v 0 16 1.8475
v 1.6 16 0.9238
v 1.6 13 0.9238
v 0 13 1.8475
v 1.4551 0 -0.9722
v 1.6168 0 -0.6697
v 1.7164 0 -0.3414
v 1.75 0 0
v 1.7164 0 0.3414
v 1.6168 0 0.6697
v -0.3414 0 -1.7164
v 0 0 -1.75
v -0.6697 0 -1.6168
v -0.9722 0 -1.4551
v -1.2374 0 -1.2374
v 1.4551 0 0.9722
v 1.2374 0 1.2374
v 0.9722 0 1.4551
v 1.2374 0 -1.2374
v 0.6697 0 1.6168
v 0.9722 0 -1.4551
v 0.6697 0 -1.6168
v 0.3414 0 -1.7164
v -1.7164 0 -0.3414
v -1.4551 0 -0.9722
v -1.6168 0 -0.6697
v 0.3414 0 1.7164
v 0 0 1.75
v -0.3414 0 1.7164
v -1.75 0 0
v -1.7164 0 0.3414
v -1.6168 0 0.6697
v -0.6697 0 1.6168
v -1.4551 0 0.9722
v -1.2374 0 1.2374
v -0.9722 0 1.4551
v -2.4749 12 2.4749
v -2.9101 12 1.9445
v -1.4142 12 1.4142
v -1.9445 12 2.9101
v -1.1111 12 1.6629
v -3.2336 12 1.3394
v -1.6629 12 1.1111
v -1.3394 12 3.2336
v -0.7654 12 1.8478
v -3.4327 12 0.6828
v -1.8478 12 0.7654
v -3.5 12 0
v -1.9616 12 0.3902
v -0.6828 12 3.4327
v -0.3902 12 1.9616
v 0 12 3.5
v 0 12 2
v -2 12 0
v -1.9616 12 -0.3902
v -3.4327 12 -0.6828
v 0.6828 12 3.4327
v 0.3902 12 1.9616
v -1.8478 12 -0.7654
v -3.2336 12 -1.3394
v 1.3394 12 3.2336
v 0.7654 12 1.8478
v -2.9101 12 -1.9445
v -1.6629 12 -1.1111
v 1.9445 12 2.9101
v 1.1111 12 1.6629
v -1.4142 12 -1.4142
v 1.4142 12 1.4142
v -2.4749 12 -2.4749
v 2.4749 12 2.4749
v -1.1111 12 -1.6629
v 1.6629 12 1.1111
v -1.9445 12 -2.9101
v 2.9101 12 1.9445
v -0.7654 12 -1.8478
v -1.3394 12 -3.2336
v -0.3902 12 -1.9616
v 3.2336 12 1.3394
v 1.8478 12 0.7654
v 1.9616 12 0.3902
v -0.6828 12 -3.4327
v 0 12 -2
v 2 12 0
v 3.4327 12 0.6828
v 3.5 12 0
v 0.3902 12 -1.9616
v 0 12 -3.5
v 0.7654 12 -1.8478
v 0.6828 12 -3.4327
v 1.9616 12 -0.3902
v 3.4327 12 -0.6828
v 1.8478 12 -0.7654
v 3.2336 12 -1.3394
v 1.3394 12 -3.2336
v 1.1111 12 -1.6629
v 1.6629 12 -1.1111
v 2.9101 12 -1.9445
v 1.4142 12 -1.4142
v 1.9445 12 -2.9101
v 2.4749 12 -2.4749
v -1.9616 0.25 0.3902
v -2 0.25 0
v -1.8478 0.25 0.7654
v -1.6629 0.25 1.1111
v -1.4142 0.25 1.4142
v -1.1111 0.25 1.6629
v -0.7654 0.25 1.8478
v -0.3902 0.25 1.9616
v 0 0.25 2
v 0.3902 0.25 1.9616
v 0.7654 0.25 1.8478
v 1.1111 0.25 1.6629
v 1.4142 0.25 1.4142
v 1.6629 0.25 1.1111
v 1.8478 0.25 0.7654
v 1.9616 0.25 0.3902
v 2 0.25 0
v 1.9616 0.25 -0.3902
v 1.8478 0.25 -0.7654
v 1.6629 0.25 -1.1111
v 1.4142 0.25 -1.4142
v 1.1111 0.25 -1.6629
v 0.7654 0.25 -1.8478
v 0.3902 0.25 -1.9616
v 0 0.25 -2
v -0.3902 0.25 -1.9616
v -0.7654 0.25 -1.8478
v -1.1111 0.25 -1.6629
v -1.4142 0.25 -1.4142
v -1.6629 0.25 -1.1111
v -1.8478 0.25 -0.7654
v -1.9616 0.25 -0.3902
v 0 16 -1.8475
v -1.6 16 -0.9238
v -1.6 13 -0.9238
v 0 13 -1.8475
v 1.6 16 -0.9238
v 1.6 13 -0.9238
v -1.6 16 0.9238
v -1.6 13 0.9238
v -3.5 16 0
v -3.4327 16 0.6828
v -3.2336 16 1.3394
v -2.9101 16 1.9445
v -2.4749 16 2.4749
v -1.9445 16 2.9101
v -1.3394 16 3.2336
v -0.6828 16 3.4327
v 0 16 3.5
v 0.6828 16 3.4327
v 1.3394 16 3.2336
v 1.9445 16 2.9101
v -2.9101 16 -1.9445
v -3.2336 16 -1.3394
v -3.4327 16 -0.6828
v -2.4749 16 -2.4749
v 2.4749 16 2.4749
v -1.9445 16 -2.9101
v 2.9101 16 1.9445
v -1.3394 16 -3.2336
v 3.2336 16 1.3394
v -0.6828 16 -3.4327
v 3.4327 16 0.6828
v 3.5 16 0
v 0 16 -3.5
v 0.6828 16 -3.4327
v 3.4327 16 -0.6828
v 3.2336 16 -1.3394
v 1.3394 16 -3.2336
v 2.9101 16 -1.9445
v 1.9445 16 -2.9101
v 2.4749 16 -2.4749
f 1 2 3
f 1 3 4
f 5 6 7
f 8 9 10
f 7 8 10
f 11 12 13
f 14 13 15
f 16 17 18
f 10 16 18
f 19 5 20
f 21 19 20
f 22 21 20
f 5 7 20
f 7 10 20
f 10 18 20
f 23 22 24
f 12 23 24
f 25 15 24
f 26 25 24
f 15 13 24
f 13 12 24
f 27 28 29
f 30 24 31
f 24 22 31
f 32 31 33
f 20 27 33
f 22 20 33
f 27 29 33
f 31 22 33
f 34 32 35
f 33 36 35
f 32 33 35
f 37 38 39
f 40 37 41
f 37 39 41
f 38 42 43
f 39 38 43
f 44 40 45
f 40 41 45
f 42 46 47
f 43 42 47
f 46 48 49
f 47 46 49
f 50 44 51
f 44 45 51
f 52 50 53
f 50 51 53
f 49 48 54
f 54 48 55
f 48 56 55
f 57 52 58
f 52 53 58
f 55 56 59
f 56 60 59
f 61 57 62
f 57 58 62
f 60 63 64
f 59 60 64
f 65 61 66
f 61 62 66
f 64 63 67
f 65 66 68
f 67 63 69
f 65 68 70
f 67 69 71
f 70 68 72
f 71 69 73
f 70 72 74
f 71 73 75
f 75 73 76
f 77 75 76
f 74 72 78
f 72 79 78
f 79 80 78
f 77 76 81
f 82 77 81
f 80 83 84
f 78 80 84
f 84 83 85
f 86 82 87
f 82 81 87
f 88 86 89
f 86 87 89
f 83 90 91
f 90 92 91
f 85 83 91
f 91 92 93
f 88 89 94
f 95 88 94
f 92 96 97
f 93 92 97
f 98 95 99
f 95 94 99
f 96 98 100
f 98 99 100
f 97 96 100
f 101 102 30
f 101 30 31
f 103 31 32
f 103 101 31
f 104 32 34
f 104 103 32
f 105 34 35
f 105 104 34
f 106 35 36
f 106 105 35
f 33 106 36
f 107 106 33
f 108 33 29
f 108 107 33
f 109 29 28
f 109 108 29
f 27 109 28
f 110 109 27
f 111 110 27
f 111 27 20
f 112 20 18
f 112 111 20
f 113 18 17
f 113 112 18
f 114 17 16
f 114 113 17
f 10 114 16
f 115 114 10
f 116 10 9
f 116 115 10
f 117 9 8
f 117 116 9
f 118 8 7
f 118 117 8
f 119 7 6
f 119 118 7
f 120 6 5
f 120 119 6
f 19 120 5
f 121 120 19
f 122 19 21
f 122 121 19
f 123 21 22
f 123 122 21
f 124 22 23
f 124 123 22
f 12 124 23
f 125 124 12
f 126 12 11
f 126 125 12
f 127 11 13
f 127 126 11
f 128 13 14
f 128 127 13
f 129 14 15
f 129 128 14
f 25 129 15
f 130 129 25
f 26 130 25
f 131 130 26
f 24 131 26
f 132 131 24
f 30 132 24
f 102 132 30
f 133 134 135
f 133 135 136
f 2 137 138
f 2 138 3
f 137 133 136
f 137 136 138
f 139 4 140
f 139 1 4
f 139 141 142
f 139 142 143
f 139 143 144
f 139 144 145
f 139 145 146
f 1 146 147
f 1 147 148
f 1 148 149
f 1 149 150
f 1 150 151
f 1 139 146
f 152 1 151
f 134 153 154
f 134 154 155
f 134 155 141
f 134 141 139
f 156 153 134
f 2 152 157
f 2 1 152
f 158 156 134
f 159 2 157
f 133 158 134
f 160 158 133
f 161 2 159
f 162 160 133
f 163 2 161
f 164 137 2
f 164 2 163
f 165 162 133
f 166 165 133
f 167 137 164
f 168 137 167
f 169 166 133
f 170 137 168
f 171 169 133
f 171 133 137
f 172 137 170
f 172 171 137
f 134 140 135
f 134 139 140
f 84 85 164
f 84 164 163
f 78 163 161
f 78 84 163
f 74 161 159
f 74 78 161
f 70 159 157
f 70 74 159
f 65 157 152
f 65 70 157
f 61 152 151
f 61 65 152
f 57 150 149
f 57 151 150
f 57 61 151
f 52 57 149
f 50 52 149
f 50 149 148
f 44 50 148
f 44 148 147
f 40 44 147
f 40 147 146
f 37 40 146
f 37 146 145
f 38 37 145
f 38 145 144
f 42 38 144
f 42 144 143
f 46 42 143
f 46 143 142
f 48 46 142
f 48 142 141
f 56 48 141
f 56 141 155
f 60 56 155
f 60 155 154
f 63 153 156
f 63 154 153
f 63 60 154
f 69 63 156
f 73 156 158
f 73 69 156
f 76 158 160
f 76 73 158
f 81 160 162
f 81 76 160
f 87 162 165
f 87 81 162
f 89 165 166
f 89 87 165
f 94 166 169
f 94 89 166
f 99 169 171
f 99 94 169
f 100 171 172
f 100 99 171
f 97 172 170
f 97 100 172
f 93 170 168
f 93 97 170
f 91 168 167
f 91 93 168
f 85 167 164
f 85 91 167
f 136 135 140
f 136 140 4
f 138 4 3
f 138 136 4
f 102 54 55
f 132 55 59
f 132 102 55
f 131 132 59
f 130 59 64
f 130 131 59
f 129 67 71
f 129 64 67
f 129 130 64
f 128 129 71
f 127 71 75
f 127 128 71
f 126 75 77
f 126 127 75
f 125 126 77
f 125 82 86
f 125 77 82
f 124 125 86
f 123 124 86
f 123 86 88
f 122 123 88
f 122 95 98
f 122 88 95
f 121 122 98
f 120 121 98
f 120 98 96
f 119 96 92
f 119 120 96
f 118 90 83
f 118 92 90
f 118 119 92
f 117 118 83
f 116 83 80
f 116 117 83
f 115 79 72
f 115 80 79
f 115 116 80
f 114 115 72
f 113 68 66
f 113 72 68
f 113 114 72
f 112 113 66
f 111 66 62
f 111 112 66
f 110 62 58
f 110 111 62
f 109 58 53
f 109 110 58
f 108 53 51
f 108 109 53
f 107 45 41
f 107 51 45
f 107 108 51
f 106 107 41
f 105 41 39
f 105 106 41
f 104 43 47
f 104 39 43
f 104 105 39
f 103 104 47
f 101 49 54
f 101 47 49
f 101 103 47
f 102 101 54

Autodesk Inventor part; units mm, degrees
ref_plane "YZ Plane" through (0, 0, 0) normal (1, 0, 0) x (0, 1, 0)
ref_plane "XZ Plane" through (0, 0, 0) normal (0, 1, 0) x (-1, 0, 0)
ref_plane "XY Plane" through (0, 0, 0) normal (0, 0, 1) x (1, 0, 0)
sketch "Sketch1" plane through (0, 0, 0) normal (0, 1, 0) x (-1, 0, 0)
  circle A0 centre (0, 0) radius 2
  dimension "d0" = 4
extrude "Extrusion1" add sketch "Sketch1" along normal blind 12
sketch "Sketch2" plane through (0, 12, 0) normal (0, 1, 0) x (1, 0, 0)
  circle A0 centre (0, 0) radius 2 projected
  circle A1 centre (0, 0) radius 3.5
  dimension "d3" = 7
extrude "Extrusion2" add sketch "Sketch2" along normal blind 4 contours A0 | A1
sketch "Sketch3" plane through (0, 16, 0) normal (0, 1, 0) x (1, 0, 0)
  circle A0 centre (0, 0) radius 3.5 projected
  line L0 (0, 1.8475) -> (1.6, 0.9238)
  line L1 (1.6, 0.9238) -> (1.6, -0.9238)
  line L2 (1.6, -0.9238) -> (0, -1.8475)
  line L3 (0, -1.8475) -> (-1.6, -0.9238)
  line L4 (-1.6, -0.9238) -> (-1.6, 0.9238)
  line L5 (-1.6, 0.9238) -> (0, 1.8475)
  dimension "d6" = 1.6
extrude "Extrusion3" cut sketch "Sketch3" against normal blind 3 contours L0 L1 L2 L3 L4 L5
thread "Thread1" size "M4x0.7" class "6g" standard "ANSI Metric M Profile" full length
chamfer "Chamfer1" distance 0.25 angle 45 1 edges at (2, 0, 0)
properties part number "SHCS4x12"
